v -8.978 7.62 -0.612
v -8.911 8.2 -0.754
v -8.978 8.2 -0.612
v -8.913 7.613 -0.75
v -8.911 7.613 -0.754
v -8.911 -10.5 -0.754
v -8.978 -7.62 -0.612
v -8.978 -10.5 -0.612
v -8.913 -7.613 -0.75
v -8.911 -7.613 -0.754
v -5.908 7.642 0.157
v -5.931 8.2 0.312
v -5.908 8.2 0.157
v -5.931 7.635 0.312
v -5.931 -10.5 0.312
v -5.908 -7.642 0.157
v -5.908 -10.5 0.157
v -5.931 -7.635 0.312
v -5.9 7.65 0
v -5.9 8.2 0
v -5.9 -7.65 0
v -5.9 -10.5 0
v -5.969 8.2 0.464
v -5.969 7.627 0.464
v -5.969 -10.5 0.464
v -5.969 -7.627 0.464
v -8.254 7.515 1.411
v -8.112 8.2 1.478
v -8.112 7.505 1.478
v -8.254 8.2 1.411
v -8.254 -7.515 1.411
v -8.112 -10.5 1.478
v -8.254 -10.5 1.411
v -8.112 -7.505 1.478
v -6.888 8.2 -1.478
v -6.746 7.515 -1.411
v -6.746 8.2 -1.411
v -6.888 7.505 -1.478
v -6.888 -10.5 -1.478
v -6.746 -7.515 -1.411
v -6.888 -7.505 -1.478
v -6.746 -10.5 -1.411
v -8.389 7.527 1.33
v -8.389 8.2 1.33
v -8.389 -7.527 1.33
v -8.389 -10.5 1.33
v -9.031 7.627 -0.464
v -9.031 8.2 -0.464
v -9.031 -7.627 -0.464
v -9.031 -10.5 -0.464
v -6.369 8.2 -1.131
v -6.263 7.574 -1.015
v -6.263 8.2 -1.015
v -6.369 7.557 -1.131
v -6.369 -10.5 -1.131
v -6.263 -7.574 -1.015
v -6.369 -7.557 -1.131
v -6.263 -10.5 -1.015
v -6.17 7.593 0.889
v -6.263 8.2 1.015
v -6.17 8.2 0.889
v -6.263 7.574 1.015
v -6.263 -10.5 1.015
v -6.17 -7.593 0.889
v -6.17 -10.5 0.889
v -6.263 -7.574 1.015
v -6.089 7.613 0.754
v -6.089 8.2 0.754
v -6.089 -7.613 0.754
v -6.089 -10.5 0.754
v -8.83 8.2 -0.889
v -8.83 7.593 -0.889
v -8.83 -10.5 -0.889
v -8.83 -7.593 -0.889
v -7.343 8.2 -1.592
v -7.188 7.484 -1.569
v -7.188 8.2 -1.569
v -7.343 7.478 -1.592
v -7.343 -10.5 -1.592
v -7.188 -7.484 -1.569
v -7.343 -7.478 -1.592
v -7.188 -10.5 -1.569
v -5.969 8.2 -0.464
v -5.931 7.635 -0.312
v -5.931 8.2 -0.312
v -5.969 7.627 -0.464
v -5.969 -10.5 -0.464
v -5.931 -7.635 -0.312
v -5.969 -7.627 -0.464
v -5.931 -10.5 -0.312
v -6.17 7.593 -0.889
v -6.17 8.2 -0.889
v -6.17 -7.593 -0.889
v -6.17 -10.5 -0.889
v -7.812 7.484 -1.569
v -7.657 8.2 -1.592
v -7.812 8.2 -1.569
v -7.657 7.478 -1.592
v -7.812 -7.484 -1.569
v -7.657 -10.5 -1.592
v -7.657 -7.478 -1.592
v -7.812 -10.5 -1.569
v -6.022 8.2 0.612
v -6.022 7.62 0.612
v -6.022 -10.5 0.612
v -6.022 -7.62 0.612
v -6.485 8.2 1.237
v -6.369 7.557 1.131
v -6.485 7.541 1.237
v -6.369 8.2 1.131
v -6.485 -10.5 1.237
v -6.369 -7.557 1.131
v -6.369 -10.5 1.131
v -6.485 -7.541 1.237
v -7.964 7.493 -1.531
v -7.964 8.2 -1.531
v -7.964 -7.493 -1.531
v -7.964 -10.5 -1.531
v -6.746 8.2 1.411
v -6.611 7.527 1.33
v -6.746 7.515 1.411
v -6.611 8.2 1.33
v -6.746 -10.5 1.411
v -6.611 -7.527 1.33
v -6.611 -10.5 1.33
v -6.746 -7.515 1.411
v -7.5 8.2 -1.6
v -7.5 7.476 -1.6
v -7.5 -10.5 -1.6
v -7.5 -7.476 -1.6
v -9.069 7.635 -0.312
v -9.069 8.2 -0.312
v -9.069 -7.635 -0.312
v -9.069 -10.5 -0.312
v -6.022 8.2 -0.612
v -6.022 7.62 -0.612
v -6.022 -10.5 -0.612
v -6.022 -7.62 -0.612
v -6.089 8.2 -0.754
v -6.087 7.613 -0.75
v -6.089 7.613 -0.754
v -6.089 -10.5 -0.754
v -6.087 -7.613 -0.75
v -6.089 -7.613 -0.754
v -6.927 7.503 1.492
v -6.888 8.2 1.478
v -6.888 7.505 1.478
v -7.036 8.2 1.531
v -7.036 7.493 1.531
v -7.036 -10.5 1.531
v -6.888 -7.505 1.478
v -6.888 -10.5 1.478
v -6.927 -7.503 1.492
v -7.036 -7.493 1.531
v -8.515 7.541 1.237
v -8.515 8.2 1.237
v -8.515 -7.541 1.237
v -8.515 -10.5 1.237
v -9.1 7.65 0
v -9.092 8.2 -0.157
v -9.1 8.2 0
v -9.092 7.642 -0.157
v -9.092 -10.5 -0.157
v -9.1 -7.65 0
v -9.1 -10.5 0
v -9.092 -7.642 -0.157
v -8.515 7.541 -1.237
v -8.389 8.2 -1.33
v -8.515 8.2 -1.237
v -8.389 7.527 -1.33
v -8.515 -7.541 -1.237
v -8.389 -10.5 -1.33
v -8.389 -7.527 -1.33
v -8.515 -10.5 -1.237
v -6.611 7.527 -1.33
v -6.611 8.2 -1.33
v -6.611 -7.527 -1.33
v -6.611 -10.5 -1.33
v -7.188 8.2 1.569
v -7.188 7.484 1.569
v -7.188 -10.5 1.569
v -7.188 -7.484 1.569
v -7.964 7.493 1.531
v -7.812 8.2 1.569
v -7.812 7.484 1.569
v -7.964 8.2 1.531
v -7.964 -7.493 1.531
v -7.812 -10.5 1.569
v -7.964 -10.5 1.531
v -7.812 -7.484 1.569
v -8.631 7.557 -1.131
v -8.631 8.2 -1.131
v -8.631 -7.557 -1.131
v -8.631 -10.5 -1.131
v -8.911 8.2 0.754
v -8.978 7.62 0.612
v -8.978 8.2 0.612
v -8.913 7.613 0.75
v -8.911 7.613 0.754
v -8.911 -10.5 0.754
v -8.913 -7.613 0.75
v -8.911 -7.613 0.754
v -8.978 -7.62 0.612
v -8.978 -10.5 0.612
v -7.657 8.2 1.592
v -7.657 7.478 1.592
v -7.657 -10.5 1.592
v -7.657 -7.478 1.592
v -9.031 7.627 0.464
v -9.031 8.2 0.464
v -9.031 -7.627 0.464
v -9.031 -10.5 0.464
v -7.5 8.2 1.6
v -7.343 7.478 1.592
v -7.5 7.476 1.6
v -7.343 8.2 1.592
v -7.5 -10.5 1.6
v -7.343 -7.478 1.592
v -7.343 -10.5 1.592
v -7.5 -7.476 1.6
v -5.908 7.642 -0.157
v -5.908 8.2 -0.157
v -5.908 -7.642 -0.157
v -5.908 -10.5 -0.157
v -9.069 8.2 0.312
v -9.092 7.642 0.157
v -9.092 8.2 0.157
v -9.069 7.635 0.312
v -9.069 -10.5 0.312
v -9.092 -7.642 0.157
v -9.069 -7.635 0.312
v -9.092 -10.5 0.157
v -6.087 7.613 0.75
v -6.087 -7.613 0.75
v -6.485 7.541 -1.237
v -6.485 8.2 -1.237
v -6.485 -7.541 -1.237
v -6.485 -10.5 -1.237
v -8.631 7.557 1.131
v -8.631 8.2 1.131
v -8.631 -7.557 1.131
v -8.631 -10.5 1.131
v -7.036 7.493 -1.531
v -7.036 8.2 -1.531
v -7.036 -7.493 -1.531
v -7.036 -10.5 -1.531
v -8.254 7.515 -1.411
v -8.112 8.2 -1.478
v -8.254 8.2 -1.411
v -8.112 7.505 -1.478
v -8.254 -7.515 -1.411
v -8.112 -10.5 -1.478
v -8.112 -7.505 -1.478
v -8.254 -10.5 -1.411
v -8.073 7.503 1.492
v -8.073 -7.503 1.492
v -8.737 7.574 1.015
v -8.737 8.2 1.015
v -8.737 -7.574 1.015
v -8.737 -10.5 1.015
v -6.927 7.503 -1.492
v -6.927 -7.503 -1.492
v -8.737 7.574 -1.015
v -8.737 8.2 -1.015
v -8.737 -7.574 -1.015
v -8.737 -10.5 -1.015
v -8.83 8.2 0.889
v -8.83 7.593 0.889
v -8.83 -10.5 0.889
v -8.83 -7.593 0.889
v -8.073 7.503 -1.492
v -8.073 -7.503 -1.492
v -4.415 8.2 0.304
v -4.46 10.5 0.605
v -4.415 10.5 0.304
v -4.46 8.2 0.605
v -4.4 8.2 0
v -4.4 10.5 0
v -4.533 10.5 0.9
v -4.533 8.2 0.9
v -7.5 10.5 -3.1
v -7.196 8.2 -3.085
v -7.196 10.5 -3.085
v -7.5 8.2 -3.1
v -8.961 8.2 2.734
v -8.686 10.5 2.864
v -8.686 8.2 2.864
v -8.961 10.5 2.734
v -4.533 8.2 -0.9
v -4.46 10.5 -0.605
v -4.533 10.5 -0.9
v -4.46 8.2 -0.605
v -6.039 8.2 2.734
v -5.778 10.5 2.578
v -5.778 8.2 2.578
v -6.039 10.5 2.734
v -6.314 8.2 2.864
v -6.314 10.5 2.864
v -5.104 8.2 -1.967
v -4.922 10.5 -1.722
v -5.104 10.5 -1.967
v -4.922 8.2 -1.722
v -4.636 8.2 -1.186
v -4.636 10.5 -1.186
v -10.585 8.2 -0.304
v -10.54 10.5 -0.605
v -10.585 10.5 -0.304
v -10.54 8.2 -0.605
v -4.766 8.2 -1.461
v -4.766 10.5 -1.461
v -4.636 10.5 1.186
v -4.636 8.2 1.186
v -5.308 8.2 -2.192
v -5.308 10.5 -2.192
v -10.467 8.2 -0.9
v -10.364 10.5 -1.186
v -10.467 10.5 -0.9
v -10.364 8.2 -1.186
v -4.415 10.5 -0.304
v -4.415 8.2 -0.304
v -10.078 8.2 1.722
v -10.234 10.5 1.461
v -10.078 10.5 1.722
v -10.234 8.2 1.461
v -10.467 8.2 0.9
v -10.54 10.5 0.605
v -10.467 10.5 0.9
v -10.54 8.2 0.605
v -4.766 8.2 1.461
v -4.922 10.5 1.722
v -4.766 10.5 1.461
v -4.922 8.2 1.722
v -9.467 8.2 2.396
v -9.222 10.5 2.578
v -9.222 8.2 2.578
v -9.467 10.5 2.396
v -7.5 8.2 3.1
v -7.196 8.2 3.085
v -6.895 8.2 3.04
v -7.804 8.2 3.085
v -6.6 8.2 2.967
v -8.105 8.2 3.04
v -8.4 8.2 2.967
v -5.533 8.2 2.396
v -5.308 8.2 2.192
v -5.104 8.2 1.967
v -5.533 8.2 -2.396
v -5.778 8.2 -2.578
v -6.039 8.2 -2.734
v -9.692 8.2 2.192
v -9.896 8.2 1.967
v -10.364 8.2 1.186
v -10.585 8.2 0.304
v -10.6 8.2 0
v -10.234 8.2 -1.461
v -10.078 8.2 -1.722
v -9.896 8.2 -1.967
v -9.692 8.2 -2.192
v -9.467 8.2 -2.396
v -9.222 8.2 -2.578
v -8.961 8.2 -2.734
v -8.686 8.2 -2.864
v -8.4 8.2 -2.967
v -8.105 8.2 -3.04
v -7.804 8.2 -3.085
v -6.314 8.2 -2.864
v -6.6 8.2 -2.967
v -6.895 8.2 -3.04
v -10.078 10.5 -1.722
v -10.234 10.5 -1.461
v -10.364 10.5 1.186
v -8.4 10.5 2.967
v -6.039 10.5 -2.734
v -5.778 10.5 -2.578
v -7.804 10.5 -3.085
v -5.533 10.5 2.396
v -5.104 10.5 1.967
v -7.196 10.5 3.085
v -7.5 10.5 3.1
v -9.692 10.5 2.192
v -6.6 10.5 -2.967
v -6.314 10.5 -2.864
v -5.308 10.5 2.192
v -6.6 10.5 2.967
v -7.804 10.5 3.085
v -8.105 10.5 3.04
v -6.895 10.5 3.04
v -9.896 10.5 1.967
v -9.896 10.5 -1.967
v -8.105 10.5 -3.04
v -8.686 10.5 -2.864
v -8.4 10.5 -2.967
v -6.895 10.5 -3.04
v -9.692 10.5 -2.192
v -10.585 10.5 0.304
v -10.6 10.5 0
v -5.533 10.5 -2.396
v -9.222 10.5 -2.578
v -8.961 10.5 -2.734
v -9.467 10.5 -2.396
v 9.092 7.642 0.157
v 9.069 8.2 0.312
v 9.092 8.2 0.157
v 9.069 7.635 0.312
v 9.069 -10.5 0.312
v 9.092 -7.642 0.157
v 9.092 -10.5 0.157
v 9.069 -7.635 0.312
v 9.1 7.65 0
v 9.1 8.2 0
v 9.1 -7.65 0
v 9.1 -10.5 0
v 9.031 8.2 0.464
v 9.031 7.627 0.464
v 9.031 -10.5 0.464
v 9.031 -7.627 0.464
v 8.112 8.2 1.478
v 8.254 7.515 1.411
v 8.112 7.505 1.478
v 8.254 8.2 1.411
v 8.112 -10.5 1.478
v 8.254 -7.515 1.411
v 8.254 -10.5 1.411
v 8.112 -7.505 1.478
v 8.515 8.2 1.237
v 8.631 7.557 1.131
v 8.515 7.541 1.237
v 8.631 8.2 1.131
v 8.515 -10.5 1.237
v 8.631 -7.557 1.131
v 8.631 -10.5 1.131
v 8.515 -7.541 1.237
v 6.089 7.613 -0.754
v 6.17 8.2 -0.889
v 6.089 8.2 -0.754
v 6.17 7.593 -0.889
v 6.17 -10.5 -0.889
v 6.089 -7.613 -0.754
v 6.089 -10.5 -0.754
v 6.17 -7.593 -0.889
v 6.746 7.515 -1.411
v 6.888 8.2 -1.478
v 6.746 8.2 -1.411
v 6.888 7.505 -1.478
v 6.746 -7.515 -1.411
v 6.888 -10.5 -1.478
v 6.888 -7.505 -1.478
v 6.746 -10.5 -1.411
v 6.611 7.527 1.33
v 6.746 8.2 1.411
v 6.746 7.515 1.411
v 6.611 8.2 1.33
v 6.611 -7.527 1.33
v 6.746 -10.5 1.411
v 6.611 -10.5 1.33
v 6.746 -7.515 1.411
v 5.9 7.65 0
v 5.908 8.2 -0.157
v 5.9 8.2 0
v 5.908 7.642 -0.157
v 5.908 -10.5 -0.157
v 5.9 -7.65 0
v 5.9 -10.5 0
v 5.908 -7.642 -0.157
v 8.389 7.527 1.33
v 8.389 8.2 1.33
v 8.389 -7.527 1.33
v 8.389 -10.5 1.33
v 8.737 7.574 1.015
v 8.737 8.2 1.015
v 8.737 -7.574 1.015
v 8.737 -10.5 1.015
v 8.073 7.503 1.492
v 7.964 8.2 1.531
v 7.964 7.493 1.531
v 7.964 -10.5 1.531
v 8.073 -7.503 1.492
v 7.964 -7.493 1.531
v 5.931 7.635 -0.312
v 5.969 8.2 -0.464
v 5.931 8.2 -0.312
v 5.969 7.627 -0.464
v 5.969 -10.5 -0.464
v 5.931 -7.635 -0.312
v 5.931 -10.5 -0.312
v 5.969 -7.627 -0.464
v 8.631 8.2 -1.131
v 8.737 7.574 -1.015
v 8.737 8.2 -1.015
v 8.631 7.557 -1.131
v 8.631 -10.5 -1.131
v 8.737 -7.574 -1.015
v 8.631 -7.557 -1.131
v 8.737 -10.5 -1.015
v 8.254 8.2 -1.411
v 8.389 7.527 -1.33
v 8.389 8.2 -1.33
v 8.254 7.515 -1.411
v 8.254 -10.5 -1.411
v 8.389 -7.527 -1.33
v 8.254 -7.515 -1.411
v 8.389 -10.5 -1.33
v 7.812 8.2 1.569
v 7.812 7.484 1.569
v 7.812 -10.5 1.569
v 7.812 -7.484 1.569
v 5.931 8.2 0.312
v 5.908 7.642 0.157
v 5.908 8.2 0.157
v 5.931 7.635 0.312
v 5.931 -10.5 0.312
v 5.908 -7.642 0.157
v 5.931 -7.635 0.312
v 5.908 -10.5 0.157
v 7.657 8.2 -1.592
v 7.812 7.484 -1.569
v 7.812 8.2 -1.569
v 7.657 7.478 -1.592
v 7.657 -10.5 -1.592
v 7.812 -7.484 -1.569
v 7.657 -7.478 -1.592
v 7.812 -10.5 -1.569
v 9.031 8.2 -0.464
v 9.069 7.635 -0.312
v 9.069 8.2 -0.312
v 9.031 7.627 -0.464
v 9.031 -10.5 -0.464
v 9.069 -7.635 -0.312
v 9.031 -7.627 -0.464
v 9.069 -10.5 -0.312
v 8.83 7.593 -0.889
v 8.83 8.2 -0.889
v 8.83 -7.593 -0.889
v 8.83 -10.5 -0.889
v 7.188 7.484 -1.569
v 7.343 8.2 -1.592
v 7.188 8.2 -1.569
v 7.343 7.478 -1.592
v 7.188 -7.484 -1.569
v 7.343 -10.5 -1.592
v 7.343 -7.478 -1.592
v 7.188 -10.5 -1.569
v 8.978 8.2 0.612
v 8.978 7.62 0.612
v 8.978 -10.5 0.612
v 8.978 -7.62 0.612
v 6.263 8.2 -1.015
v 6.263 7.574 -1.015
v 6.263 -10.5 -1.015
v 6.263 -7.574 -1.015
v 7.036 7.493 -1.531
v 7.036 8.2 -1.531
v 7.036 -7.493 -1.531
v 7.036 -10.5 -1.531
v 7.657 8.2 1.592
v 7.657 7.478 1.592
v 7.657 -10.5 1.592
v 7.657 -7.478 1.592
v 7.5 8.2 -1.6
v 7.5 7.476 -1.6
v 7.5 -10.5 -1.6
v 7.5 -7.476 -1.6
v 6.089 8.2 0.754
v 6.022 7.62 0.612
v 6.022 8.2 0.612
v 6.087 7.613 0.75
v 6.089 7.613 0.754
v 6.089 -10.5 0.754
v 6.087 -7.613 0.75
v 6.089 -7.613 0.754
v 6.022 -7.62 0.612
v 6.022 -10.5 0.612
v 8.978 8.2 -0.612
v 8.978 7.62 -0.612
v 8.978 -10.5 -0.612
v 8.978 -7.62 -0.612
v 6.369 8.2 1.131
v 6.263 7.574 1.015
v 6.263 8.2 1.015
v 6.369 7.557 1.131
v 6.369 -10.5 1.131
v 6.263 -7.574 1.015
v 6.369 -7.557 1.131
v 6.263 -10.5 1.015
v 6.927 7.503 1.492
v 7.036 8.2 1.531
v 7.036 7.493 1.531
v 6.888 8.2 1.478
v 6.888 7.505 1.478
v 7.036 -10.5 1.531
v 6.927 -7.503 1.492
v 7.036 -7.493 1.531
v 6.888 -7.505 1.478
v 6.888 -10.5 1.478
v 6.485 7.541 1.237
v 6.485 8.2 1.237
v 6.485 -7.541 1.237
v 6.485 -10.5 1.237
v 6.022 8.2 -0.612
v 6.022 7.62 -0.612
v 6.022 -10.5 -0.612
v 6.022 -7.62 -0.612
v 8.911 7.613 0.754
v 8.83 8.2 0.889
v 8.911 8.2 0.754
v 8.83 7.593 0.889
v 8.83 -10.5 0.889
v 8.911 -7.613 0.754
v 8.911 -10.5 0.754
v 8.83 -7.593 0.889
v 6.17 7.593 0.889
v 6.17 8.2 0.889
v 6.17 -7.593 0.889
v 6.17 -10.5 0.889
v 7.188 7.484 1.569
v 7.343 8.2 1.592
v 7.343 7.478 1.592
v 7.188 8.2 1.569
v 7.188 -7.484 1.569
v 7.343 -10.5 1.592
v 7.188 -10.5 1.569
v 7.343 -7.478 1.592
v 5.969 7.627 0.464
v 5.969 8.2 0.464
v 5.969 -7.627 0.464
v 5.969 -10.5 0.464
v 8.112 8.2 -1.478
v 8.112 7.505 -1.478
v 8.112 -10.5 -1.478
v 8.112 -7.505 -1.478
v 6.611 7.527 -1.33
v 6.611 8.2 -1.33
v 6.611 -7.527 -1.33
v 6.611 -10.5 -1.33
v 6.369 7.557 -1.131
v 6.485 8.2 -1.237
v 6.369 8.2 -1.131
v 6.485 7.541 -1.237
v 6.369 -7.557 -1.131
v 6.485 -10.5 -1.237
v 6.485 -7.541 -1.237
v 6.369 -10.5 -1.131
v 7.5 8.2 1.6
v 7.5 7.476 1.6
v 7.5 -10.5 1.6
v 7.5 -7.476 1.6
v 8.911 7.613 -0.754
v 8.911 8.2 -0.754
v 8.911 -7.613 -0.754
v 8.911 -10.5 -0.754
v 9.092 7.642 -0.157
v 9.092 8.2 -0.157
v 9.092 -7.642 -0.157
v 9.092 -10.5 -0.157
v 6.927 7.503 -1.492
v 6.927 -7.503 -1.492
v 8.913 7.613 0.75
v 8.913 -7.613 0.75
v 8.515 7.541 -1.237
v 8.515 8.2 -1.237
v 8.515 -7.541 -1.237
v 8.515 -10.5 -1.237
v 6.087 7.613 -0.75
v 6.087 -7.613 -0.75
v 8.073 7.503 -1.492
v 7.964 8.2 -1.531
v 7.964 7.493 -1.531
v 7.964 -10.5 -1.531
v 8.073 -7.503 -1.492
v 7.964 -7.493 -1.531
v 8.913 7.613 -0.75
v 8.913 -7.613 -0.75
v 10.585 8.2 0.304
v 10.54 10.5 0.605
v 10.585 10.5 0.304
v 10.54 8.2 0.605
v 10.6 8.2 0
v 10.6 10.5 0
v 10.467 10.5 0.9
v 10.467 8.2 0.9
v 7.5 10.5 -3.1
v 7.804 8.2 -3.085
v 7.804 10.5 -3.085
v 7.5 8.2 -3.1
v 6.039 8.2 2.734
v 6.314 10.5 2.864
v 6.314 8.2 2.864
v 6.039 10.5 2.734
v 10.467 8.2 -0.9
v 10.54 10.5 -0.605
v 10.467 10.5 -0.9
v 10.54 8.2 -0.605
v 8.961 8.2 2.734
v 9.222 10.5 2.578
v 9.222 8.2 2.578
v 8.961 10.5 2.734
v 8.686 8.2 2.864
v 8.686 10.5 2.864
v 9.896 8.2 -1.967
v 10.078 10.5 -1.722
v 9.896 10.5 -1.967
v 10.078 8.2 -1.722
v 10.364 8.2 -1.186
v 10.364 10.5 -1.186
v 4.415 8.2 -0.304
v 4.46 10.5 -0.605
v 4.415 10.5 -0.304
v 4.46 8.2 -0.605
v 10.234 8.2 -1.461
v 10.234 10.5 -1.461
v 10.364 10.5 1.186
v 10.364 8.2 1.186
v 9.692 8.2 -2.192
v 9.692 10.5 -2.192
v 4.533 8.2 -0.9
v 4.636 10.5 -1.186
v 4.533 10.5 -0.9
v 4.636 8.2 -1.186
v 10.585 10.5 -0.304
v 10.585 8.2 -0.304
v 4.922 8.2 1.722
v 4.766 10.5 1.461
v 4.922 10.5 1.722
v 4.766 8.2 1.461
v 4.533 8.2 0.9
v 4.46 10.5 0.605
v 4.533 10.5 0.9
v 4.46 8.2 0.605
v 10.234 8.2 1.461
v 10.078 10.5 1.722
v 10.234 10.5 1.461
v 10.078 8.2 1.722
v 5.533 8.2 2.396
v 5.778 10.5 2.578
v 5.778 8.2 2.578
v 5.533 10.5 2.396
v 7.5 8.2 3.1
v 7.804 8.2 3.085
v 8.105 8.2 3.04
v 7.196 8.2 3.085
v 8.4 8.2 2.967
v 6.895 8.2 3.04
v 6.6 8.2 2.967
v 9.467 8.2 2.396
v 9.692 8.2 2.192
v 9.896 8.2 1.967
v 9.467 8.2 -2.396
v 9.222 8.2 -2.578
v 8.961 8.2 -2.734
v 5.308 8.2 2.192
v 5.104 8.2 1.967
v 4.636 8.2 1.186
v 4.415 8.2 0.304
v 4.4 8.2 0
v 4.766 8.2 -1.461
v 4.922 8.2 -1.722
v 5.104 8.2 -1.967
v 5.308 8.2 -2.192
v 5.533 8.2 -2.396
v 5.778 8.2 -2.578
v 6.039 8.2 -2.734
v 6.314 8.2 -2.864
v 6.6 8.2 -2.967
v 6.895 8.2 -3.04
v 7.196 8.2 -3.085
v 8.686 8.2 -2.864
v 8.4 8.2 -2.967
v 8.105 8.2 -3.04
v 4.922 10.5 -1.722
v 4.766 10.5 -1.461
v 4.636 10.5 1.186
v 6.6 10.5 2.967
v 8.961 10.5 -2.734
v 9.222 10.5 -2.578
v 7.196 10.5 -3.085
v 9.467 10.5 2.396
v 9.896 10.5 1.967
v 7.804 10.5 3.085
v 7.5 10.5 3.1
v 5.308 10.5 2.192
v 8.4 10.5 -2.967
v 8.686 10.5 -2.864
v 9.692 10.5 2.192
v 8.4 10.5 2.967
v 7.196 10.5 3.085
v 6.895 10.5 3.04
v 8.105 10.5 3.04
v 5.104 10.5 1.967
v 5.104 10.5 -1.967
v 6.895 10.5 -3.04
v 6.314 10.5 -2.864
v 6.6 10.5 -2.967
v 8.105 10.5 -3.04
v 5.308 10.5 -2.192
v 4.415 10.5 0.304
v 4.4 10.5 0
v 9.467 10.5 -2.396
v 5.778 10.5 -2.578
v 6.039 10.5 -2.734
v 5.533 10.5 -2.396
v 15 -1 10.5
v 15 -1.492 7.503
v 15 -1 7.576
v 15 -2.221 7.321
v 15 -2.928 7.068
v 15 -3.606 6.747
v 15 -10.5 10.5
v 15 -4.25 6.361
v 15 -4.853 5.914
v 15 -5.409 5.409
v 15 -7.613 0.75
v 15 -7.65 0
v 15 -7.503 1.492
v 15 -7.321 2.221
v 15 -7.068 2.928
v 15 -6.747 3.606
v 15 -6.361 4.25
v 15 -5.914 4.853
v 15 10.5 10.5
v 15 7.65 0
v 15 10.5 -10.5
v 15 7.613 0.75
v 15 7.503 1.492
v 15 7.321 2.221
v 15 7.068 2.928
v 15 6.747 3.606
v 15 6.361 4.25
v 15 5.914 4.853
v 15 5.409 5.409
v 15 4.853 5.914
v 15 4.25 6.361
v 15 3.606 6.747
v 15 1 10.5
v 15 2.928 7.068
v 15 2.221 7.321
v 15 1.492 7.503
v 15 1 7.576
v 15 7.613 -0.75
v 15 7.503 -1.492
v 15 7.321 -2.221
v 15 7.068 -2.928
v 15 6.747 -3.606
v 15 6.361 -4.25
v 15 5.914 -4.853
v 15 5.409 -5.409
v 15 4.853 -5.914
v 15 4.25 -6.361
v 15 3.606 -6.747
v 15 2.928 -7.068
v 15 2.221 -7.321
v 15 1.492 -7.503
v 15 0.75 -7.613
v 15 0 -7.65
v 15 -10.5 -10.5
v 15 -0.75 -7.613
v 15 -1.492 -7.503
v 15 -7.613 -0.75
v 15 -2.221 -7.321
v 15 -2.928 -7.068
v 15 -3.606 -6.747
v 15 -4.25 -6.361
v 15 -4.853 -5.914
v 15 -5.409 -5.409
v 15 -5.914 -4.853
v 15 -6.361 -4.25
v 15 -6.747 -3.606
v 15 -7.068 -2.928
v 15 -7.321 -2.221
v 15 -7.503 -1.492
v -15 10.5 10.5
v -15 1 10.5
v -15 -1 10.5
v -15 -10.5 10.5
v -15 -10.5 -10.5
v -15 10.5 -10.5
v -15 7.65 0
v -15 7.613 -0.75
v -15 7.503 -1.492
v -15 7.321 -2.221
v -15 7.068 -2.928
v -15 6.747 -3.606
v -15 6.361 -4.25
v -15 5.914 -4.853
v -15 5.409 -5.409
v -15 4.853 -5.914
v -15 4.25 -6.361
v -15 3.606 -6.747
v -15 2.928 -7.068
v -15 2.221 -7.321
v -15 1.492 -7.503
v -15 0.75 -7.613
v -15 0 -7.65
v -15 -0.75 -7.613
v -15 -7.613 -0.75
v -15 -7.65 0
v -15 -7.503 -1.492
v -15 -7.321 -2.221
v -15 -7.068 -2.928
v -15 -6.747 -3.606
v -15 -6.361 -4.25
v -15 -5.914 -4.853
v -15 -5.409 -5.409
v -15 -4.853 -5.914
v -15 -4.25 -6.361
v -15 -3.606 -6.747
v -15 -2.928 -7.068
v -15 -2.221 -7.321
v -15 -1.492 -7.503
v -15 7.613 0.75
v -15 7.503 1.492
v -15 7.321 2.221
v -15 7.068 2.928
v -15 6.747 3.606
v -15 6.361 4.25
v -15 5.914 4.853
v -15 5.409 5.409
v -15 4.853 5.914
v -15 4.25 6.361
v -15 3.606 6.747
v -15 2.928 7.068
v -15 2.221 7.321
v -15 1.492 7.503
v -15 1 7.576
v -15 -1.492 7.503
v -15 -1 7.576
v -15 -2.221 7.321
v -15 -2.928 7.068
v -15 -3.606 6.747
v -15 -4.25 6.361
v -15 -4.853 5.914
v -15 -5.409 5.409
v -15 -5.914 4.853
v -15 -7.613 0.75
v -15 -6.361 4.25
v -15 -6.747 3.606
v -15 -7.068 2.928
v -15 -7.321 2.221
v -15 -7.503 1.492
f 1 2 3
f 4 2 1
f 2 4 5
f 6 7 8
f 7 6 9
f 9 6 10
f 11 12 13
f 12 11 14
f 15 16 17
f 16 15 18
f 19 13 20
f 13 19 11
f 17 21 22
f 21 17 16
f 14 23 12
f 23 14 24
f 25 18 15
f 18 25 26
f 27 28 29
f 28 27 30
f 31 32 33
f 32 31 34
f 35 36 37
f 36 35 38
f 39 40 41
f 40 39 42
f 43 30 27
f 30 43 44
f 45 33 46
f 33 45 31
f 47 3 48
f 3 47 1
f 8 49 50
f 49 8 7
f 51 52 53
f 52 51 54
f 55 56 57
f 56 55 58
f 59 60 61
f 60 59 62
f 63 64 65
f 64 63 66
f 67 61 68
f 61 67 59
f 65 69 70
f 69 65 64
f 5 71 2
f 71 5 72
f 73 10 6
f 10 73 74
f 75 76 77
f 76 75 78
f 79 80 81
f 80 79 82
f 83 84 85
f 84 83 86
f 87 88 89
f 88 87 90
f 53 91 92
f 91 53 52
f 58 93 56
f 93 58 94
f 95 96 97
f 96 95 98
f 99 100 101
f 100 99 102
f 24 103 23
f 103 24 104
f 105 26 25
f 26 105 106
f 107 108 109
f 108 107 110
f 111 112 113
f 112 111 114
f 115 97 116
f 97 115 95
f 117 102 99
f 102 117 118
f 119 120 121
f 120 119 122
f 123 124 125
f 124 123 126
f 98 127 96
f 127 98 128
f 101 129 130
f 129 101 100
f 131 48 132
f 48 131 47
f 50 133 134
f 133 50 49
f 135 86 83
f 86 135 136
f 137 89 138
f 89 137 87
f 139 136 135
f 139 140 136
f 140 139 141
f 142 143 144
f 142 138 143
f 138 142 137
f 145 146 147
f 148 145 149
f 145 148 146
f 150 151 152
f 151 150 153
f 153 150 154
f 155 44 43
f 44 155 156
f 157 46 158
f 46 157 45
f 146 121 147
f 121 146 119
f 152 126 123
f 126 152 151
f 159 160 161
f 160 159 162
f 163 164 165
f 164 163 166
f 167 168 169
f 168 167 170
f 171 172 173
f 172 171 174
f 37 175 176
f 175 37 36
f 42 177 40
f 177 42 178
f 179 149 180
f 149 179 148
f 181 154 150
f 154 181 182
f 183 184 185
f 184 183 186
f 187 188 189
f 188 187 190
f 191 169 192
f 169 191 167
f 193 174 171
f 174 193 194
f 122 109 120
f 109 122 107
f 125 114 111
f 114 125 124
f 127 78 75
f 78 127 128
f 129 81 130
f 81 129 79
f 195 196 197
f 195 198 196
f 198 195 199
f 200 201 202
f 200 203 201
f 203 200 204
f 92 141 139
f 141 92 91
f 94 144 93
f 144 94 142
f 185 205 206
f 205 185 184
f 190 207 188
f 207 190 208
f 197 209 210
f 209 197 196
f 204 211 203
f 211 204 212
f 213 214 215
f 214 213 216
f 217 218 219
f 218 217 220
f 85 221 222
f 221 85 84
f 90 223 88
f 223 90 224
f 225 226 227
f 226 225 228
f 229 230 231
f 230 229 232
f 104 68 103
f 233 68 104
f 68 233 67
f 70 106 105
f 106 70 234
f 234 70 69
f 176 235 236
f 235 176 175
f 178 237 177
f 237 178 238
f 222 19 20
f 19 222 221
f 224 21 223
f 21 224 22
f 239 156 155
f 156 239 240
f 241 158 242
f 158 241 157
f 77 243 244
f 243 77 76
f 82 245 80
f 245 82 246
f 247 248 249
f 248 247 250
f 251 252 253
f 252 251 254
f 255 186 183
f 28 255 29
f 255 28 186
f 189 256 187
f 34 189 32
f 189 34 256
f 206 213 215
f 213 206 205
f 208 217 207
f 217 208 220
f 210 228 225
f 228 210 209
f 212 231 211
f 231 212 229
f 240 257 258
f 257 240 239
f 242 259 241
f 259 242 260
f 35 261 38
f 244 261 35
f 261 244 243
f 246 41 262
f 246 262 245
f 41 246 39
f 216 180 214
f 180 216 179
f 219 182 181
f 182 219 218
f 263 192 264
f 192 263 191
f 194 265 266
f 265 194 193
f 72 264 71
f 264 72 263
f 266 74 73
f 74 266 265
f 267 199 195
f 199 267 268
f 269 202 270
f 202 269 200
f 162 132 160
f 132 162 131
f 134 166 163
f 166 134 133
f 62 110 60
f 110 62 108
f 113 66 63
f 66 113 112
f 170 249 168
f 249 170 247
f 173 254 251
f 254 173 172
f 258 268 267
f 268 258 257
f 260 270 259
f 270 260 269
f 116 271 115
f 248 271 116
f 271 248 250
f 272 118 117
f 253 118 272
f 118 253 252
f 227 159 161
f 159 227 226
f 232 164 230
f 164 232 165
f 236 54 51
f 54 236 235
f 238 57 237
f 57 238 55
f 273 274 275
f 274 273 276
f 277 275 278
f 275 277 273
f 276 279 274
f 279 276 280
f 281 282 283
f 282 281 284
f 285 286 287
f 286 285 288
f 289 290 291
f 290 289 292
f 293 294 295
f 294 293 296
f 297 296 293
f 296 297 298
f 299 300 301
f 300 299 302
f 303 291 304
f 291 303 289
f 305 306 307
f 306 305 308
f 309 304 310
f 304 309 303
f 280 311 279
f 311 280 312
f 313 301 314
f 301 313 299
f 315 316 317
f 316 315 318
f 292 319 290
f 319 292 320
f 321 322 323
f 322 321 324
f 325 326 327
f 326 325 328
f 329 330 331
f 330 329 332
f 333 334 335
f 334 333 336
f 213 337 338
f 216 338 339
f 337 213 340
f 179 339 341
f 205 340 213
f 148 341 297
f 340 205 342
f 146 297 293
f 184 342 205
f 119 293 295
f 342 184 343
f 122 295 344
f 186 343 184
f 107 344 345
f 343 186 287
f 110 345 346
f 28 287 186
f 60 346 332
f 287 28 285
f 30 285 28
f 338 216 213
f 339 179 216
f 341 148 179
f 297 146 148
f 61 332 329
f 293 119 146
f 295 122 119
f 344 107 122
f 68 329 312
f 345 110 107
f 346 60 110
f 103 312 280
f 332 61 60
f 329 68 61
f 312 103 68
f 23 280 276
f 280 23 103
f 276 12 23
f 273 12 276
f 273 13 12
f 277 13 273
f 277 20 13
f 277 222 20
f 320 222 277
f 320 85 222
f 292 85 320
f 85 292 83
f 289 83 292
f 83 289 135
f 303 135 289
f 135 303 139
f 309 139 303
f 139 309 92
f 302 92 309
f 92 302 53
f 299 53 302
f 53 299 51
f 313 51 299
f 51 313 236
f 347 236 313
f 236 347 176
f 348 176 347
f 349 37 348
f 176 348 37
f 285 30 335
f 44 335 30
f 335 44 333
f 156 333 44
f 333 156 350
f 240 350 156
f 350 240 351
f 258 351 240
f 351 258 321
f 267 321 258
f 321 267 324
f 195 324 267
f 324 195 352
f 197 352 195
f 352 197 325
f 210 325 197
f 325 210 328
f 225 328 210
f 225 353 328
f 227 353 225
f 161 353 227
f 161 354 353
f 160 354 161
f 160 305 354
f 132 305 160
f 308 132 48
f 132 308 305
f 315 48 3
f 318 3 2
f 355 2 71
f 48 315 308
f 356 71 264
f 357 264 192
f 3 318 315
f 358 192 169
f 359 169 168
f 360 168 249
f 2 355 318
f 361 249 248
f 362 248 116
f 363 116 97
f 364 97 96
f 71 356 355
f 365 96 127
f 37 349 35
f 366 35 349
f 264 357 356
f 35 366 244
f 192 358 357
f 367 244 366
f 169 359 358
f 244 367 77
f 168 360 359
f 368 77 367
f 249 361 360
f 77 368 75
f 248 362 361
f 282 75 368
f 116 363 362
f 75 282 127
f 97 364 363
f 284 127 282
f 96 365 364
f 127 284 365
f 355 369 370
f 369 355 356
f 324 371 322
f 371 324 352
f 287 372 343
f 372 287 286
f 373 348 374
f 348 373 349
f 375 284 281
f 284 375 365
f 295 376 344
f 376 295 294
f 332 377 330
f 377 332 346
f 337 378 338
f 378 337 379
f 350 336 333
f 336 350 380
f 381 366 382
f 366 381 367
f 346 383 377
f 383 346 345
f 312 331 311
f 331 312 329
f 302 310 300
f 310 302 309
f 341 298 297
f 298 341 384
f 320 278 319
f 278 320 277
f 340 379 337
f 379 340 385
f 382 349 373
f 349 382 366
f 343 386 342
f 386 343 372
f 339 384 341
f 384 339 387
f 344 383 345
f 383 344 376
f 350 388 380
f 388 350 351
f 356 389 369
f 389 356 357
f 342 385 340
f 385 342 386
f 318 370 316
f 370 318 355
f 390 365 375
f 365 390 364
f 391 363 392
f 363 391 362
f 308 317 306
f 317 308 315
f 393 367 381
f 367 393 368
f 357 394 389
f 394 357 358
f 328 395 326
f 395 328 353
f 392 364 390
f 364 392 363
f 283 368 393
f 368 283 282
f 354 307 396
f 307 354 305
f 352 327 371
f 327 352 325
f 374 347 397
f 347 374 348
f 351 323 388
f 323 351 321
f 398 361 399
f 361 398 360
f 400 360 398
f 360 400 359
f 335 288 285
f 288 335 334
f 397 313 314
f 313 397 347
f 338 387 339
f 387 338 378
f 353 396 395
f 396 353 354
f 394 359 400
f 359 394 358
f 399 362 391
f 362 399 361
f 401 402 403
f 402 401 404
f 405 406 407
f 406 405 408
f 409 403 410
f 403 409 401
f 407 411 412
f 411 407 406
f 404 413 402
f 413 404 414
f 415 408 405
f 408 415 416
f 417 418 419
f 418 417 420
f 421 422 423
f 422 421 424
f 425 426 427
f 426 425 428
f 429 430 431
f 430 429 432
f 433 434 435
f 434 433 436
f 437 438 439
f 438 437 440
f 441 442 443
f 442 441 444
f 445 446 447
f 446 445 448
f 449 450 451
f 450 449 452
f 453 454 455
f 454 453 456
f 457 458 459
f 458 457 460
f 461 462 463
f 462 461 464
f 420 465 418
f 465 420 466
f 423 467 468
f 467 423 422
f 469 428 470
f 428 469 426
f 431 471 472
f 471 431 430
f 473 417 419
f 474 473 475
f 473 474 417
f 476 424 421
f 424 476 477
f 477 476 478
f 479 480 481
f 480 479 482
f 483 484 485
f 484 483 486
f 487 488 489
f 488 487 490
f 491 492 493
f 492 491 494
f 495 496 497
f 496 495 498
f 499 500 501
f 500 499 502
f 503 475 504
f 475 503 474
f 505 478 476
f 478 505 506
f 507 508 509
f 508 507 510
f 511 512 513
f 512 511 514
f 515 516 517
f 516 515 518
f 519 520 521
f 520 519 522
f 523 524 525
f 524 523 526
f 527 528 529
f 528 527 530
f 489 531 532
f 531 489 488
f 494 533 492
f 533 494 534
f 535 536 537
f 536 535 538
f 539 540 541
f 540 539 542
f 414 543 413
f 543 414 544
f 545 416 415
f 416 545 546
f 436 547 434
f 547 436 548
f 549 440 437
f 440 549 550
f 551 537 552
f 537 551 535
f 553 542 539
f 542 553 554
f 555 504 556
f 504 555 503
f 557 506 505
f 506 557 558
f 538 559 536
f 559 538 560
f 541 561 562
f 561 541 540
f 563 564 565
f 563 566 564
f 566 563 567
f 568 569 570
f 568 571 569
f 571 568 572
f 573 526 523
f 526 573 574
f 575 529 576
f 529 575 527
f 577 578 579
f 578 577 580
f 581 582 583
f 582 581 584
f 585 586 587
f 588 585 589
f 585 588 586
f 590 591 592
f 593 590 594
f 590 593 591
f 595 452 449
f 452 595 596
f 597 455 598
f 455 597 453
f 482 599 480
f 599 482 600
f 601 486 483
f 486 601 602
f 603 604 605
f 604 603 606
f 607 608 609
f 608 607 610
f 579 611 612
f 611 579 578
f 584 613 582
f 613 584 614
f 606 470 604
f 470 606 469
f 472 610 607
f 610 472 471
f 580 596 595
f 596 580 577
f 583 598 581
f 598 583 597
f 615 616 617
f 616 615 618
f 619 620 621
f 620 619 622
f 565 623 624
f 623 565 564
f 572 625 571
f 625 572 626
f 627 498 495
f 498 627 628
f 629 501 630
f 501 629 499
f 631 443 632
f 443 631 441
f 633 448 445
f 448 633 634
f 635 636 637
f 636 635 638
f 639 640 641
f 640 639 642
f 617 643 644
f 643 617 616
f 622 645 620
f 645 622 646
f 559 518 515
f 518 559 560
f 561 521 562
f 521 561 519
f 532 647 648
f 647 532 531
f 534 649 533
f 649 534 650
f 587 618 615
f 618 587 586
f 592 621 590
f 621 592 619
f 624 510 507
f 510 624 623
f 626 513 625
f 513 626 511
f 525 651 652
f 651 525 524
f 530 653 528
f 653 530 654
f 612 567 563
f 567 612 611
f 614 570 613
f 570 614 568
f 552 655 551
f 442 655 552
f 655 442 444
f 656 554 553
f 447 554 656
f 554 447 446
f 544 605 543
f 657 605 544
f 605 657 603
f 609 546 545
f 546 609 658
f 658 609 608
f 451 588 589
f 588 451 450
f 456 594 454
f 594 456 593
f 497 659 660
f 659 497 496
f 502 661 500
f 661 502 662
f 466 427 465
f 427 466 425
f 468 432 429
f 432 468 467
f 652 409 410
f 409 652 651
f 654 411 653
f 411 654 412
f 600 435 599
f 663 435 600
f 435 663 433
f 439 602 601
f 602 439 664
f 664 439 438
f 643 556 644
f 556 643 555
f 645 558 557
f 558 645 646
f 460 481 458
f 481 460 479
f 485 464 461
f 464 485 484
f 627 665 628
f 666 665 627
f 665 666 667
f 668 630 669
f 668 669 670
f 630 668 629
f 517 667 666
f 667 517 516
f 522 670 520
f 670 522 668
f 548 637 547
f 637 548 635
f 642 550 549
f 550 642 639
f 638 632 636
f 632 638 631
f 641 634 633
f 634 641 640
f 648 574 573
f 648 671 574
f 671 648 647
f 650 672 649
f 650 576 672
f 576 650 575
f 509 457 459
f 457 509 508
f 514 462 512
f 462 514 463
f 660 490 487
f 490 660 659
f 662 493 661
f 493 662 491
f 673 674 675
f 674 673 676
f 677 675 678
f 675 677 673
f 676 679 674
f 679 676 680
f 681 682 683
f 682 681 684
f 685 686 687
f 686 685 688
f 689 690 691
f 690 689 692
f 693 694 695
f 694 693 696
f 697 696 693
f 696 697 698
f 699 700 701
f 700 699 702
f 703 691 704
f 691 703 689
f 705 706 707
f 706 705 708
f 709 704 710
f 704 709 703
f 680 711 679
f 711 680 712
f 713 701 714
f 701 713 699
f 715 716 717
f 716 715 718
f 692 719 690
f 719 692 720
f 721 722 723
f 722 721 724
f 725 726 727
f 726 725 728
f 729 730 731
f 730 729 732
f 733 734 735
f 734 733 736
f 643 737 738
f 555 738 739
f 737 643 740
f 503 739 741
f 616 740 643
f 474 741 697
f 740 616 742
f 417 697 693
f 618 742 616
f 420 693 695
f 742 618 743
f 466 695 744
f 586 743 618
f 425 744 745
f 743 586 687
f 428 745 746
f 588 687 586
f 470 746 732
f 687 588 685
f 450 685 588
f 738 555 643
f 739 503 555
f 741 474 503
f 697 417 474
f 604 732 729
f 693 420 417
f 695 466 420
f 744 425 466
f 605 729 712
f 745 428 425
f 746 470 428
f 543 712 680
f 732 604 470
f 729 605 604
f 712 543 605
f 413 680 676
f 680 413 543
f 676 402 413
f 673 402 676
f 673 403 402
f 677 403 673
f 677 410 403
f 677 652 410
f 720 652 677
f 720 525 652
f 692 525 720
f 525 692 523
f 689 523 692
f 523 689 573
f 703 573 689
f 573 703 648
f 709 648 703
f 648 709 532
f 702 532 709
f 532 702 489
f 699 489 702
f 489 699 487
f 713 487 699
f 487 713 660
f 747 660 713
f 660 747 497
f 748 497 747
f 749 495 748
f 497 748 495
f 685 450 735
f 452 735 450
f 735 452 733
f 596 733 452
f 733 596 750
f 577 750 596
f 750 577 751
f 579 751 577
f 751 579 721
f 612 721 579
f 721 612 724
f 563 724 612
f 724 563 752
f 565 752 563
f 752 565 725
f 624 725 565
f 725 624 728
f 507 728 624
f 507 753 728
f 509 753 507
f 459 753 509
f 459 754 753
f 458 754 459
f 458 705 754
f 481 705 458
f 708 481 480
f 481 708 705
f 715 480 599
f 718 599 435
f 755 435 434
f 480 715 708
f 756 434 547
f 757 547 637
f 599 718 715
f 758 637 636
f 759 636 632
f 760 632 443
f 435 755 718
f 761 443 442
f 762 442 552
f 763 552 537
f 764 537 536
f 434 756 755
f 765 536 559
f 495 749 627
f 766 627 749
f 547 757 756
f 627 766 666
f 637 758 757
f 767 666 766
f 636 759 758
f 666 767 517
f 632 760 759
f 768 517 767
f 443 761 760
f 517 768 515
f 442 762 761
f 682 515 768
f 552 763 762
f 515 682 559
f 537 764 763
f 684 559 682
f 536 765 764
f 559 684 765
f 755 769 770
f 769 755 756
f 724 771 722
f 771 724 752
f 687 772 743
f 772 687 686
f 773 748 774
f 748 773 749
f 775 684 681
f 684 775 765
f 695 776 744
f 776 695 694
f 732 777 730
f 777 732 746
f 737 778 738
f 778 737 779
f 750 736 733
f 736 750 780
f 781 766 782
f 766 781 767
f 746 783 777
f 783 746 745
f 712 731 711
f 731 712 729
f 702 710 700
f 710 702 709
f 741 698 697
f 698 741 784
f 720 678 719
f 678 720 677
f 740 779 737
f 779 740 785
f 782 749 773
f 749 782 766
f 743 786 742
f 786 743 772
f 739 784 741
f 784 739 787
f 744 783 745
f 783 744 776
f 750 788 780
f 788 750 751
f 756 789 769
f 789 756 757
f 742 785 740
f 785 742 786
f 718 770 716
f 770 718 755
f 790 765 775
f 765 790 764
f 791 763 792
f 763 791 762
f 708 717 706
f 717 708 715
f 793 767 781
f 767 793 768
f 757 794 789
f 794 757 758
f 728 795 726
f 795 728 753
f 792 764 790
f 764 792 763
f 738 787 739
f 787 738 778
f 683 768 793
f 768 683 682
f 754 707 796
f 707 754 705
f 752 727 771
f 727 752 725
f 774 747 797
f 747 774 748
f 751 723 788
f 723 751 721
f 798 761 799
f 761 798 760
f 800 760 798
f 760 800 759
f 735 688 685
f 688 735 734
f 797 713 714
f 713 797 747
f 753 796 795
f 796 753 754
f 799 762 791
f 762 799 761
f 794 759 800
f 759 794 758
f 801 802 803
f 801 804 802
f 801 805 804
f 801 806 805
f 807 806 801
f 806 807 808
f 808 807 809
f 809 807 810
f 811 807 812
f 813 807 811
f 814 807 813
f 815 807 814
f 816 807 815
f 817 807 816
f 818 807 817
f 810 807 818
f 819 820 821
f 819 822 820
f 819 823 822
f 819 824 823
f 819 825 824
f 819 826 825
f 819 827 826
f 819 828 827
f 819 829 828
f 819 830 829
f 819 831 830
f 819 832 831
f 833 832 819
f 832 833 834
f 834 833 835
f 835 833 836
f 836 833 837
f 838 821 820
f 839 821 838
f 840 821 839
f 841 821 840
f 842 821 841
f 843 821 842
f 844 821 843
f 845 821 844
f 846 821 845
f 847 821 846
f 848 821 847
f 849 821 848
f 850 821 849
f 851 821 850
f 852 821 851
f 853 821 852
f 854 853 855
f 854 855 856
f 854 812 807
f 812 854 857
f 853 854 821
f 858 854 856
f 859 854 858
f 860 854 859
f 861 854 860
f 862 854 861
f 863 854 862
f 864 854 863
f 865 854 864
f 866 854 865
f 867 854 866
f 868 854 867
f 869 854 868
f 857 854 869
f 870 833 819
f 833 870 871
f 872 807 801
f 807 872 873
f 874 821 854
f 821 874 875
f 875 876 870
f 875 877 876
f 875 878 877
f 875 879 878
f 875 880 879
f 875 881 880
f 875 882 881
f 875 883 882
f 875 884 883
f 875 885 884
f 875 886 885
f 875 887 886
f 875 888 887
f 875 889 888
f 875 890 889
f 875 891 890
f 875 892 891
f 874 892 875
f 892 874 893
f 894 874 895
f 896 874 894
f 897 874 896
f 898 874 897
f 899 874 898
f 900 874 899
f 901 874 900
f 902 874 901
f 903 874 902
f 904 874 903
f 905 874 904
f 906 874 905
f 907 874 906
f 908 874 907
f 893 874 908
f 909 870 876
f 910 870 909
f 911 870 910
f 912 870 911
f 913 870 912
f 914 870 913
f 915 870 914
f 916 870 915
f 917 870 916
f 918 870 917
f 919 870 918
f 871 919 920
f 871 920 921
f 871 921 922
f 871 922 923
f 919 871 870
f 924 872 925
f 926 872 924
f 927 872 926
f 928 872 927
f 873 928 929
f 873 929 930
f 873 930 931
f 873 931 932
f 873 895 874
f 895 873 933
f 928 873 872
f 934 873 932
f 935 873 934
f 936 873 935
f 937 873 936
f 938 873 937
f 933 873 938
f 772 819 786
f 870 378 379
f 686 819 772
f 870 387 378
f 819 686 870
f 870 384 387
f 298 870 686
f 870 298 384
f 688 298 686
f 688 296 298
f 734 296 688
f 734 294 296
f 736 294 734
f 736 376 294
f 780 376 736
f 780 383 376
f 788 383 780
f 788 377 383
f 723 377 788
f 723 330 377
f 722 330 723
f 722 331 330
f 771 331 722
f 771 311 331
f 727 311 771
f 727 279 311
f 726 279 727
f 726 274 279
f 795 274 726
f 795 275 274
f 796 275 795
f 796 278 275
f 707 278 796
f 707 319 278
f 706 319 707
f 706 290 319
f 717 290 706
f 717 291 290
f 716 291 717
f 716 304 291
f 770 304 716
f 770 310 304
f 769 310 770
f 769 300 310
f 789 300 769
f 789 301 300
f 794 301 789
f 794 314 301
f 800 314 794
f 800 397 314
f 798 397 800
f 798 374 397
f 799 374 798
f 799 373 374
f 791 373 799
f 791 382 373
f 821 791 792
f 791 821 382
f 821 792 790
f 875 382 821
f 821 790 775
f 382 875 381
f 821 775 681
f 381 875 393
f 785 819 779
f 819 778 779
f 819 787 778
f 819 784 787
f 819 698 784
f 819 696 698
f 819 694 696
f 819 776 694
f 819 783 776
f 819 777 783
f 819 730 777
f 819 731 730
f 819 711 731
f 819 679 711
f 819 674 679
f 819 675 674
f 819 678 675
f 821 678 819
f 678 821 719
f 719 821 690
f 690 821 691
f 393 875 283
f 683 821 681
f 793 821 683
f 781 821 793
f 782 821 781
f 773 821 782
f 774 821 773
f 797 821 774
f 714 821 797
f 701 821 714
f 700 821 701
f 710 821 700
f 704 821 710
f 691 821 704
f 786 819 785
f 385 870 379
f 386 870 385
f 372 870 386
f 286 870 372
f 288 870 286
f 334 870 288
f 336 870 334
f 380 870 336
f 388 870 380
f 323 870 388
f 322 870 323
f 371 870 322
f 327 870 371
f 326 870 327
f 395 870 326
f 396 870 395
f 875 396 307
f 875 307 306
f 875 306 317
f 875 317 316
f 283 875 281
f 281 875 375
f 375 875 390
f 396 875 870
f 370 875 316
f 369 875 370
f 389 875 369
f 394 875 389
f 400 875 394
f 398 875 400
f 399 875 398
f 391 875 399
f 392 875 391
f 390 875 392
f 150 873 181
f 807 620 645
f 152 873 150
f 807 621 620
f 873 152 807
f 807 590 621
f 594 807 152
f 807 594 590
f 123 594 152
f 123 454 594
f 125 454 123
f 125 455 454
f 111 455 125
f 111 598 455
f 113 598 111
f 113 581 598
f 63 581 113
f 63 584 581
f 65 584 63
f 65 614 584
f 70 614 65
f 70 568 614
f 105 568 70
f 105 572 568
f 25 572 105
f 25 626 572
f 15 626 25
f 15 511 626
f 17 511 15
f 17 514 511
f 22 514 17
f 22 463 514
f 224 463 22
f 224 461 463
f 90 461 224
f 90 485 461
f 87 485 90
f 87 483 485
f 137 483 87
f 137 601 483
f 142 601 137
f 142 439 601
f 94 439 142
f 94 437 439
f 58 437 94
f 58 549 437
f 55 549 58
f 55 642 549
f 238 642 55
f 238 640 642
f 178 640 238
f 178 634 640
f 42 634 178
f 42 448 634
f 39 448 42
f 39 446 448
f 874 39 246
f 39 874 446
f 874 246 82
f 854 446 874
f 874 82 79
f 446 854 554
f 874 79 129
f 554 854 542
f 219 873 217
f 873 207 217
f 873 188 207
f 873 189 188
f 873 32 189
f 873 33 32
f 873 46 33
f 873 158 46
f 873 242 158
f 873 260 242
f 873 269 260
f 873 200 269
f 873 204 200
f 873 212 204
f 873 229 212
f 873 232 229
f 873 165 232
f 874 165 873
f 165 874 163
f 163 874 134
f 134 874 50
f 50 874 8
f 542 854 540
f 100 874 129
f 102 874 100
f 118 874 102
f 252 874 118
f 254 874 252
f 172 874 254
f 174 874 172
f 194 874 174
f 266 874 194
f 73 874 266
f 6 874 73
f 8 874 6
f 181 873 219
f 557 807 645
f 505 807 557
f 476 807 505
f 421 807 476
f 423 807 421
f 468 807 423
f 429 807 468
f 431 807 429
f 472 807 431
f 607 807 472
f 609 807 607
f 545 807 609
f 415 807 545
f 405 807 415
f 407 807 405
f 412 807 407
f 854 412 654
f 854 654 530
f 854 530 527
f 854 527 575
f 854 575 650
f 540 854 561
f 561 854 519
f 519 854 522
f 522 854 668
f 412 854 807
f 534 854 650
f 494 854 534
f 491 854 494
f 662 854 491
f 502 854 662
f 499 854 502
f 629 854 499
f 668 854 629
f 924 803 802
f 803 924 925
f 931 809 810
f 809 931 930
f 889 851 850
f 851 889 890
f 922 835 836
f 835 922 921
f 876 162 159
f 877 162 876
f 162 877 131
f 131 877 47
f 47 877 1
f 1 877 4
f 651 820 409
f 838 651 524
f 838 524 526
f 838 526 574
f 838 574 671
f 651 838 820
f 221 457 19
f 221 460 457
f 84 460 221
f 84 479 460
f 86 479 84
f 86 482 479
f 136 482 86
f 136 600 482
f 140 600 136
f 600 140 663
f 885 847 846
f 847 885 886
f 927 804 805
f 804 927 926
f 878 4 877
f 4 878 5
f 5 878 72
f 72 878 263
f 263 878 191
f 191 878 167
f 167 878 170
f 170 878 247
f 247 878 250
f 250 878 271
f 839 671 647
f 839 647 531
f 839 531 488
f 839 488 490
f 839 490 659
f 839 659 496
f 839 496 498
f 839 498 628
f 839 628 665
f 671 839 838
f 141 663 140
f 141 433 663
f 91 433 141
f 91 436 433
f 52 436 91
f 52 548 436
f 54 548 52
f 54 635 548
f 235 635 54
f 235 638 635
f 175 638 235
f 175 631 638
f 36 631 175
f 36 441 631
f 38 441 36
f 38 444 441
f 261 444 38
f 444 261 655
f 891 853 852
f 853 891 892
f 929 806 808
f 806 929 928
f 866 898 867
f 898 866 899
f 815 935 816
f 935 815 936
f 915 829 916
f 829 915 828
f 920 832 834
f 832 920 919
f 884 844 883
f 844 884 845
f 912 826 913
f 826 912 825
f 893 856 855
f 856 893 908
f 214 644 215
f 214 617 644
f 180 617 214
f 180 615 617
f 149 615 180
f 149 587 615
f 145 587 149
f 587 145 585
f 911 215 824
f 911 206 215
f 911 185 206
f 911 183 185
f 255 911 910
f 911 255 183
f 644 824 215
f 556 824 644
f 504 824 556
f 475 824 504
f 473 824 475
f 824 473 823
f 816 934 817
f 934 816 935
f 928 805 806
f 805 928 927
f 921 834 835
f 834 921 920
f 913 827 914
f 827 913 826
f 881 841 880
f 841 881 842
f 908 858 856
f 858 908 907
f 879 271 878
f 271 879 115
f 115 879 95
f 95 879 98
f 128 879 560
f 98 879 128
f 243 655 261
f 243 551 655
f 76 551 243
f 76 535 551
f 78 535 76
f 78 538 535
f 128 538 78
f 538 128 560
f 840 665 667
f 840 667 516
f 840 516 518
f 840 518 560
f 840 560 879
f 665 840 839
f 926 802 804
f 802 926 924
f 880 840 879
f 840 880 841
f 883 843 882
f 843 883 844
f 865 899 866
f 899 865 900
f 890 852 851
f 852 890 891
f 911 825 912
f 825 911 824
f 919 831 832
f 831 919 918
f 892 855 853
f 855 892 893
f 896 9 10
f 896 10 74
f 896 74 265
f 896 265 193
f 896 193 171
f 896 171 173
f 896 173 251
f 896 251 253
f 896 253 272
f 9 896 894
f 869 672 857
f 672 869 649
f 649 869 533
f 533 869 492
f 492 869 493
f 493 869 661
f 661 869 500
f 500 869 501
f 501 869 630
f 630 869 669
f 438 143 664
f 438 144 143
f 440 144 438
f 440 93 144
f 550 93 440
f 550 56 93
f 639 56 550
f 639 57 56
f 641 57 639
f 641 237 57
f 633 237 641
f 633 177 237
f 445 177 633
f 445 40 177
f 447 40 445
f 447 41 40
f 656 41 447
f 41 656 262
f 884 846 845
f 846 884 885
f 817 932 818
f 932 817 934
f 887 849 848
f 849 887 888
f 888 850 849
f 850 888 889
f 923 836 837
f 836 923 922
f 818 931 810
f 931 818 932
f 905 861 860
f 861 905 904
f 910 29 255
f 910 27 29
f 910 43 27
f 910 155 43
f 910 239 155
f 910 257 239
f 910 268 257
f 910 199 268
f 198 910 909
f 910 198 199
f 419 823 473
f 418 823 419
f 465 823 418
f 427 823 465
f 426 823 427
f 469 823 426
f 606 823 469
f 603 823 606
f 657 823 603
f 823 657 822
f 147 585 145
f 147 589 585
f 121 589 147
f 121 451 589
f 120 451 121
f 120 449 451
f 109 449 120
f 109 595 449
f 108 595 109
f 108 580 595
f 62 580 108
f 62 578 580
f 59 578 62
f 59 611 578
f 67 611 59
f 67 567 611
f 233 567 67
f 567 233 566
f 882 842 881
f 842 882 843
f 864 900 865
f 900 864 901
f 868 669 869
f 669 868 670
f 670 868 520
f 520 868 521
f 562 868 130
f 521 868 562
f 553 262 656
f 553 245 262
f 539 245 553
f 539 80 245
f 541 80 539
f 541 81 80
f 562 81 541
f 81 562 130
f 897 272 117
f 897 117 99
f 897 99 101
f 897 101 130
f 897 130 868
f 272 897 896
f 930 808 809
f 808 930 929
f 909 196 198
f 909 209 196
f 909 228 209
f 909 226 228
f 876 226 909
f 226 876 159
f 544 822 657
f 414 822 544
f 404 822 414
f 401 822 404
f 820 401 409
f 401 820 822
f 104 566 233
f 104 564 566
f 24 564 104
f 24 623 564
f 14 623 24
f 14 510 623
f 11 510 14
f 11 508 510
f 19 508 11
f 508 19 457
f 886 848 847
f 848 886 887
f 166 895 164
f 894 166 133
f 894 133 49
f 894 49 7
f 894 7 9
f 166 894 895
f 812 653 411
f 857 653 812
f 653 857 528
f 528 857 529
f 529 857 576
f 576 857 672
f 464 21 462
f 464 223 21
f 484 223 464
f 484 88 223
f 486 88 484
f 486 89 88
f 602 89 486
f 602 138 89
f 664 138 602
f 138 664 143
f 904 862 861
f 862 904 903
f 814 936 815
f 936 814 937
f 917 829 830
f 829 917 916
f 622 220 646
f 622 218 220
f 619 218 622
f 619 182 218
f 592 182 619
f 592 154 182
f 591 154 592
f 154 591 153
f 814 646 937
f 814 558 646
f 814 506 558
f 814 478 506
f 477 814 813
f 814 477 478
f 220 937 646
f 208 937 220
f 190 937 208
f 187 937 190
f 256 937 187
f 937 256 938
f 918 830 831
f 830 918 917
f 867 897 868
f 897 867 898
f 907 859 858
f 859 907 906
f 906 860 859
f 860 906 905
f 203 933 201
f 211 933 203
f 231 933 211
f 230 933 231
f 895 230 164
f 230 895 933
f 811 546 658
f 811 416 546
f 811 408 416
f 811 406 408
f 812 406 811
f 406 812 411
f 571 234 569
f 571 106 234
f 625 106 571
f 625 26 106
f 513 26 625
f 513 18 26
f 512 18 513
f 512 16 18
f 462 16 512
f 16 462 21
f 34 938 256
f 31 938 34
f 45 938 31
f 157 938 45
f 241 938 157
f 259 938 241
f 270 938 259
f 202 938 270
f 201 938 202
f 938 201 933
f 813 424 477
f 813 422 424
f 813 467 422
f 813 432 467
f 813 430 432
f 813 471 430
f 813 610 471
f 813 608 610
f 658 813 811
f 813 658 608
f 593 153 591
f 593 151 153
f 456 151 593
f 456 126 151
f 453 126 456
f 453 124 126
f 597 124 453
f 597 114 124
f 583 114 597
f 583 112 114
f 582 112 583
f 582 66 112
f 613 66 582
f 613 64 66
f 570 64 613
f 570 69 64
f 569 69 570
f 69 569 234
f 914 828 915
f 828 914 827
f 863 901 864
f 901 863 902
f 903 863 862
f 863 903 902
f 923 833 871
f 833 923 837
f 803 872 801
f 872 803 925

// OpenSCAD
$fn=64;

bearing_od = 15;
bearing_len = 24;
shaft_d = 8;

wall = 3;
clearance = 0.3;

block_len = bearing_len + 2*wall;
block_w   = bearing_od + 2*wall;
block_h   = bearing_od + 2*wall;

clamp_gap = 2.0;
screw_d = 3.2;
screw_head_d = 6.2;
screw_head_h = 2.2;
screw_offset_y = (block_w/2 - wall/2);

module lm8uu_holder() {
    difference() {
        union() {
            cube([block_len, block_w, block_h], center=true);
        }

        // Bearing pocket (along X)
        rotate([0,90,0])
            cylinder(d=bearing_od + clearance, h=block_len + 2, center=true);

        // Through shaft clearance (optional, along X)
        rotate([0,90,0])
            cylinder(d=shaft_d + 1.0, h=block_len + 2, center=true);

        // Clamp slit (opens to +Z)
        translate([0,0,block_h/4])
            cube([block_len + 2, clamp_gap, block_h], center=true);

        // Two clamp screw holes (along Y), with counterbore for heads on +Y side
        for (xpos = [-block_len/4, block_len/4]) {
            // Through hole
            translate([xpos, 0, 0])
                rotate([90,0,0])
                    cylinder(d=screw_d, h=block_w + 2, center=true);

            // Counterbore on +Y side
            translate([xpos, block_w/2 - screw_head_h/2, 0])
                rotate([90,0,0])
                    cylinder(d=screw_head_d, h=screw_head_h + 0.2, center=true);
        }
    }
}

lm8uu_holder();
